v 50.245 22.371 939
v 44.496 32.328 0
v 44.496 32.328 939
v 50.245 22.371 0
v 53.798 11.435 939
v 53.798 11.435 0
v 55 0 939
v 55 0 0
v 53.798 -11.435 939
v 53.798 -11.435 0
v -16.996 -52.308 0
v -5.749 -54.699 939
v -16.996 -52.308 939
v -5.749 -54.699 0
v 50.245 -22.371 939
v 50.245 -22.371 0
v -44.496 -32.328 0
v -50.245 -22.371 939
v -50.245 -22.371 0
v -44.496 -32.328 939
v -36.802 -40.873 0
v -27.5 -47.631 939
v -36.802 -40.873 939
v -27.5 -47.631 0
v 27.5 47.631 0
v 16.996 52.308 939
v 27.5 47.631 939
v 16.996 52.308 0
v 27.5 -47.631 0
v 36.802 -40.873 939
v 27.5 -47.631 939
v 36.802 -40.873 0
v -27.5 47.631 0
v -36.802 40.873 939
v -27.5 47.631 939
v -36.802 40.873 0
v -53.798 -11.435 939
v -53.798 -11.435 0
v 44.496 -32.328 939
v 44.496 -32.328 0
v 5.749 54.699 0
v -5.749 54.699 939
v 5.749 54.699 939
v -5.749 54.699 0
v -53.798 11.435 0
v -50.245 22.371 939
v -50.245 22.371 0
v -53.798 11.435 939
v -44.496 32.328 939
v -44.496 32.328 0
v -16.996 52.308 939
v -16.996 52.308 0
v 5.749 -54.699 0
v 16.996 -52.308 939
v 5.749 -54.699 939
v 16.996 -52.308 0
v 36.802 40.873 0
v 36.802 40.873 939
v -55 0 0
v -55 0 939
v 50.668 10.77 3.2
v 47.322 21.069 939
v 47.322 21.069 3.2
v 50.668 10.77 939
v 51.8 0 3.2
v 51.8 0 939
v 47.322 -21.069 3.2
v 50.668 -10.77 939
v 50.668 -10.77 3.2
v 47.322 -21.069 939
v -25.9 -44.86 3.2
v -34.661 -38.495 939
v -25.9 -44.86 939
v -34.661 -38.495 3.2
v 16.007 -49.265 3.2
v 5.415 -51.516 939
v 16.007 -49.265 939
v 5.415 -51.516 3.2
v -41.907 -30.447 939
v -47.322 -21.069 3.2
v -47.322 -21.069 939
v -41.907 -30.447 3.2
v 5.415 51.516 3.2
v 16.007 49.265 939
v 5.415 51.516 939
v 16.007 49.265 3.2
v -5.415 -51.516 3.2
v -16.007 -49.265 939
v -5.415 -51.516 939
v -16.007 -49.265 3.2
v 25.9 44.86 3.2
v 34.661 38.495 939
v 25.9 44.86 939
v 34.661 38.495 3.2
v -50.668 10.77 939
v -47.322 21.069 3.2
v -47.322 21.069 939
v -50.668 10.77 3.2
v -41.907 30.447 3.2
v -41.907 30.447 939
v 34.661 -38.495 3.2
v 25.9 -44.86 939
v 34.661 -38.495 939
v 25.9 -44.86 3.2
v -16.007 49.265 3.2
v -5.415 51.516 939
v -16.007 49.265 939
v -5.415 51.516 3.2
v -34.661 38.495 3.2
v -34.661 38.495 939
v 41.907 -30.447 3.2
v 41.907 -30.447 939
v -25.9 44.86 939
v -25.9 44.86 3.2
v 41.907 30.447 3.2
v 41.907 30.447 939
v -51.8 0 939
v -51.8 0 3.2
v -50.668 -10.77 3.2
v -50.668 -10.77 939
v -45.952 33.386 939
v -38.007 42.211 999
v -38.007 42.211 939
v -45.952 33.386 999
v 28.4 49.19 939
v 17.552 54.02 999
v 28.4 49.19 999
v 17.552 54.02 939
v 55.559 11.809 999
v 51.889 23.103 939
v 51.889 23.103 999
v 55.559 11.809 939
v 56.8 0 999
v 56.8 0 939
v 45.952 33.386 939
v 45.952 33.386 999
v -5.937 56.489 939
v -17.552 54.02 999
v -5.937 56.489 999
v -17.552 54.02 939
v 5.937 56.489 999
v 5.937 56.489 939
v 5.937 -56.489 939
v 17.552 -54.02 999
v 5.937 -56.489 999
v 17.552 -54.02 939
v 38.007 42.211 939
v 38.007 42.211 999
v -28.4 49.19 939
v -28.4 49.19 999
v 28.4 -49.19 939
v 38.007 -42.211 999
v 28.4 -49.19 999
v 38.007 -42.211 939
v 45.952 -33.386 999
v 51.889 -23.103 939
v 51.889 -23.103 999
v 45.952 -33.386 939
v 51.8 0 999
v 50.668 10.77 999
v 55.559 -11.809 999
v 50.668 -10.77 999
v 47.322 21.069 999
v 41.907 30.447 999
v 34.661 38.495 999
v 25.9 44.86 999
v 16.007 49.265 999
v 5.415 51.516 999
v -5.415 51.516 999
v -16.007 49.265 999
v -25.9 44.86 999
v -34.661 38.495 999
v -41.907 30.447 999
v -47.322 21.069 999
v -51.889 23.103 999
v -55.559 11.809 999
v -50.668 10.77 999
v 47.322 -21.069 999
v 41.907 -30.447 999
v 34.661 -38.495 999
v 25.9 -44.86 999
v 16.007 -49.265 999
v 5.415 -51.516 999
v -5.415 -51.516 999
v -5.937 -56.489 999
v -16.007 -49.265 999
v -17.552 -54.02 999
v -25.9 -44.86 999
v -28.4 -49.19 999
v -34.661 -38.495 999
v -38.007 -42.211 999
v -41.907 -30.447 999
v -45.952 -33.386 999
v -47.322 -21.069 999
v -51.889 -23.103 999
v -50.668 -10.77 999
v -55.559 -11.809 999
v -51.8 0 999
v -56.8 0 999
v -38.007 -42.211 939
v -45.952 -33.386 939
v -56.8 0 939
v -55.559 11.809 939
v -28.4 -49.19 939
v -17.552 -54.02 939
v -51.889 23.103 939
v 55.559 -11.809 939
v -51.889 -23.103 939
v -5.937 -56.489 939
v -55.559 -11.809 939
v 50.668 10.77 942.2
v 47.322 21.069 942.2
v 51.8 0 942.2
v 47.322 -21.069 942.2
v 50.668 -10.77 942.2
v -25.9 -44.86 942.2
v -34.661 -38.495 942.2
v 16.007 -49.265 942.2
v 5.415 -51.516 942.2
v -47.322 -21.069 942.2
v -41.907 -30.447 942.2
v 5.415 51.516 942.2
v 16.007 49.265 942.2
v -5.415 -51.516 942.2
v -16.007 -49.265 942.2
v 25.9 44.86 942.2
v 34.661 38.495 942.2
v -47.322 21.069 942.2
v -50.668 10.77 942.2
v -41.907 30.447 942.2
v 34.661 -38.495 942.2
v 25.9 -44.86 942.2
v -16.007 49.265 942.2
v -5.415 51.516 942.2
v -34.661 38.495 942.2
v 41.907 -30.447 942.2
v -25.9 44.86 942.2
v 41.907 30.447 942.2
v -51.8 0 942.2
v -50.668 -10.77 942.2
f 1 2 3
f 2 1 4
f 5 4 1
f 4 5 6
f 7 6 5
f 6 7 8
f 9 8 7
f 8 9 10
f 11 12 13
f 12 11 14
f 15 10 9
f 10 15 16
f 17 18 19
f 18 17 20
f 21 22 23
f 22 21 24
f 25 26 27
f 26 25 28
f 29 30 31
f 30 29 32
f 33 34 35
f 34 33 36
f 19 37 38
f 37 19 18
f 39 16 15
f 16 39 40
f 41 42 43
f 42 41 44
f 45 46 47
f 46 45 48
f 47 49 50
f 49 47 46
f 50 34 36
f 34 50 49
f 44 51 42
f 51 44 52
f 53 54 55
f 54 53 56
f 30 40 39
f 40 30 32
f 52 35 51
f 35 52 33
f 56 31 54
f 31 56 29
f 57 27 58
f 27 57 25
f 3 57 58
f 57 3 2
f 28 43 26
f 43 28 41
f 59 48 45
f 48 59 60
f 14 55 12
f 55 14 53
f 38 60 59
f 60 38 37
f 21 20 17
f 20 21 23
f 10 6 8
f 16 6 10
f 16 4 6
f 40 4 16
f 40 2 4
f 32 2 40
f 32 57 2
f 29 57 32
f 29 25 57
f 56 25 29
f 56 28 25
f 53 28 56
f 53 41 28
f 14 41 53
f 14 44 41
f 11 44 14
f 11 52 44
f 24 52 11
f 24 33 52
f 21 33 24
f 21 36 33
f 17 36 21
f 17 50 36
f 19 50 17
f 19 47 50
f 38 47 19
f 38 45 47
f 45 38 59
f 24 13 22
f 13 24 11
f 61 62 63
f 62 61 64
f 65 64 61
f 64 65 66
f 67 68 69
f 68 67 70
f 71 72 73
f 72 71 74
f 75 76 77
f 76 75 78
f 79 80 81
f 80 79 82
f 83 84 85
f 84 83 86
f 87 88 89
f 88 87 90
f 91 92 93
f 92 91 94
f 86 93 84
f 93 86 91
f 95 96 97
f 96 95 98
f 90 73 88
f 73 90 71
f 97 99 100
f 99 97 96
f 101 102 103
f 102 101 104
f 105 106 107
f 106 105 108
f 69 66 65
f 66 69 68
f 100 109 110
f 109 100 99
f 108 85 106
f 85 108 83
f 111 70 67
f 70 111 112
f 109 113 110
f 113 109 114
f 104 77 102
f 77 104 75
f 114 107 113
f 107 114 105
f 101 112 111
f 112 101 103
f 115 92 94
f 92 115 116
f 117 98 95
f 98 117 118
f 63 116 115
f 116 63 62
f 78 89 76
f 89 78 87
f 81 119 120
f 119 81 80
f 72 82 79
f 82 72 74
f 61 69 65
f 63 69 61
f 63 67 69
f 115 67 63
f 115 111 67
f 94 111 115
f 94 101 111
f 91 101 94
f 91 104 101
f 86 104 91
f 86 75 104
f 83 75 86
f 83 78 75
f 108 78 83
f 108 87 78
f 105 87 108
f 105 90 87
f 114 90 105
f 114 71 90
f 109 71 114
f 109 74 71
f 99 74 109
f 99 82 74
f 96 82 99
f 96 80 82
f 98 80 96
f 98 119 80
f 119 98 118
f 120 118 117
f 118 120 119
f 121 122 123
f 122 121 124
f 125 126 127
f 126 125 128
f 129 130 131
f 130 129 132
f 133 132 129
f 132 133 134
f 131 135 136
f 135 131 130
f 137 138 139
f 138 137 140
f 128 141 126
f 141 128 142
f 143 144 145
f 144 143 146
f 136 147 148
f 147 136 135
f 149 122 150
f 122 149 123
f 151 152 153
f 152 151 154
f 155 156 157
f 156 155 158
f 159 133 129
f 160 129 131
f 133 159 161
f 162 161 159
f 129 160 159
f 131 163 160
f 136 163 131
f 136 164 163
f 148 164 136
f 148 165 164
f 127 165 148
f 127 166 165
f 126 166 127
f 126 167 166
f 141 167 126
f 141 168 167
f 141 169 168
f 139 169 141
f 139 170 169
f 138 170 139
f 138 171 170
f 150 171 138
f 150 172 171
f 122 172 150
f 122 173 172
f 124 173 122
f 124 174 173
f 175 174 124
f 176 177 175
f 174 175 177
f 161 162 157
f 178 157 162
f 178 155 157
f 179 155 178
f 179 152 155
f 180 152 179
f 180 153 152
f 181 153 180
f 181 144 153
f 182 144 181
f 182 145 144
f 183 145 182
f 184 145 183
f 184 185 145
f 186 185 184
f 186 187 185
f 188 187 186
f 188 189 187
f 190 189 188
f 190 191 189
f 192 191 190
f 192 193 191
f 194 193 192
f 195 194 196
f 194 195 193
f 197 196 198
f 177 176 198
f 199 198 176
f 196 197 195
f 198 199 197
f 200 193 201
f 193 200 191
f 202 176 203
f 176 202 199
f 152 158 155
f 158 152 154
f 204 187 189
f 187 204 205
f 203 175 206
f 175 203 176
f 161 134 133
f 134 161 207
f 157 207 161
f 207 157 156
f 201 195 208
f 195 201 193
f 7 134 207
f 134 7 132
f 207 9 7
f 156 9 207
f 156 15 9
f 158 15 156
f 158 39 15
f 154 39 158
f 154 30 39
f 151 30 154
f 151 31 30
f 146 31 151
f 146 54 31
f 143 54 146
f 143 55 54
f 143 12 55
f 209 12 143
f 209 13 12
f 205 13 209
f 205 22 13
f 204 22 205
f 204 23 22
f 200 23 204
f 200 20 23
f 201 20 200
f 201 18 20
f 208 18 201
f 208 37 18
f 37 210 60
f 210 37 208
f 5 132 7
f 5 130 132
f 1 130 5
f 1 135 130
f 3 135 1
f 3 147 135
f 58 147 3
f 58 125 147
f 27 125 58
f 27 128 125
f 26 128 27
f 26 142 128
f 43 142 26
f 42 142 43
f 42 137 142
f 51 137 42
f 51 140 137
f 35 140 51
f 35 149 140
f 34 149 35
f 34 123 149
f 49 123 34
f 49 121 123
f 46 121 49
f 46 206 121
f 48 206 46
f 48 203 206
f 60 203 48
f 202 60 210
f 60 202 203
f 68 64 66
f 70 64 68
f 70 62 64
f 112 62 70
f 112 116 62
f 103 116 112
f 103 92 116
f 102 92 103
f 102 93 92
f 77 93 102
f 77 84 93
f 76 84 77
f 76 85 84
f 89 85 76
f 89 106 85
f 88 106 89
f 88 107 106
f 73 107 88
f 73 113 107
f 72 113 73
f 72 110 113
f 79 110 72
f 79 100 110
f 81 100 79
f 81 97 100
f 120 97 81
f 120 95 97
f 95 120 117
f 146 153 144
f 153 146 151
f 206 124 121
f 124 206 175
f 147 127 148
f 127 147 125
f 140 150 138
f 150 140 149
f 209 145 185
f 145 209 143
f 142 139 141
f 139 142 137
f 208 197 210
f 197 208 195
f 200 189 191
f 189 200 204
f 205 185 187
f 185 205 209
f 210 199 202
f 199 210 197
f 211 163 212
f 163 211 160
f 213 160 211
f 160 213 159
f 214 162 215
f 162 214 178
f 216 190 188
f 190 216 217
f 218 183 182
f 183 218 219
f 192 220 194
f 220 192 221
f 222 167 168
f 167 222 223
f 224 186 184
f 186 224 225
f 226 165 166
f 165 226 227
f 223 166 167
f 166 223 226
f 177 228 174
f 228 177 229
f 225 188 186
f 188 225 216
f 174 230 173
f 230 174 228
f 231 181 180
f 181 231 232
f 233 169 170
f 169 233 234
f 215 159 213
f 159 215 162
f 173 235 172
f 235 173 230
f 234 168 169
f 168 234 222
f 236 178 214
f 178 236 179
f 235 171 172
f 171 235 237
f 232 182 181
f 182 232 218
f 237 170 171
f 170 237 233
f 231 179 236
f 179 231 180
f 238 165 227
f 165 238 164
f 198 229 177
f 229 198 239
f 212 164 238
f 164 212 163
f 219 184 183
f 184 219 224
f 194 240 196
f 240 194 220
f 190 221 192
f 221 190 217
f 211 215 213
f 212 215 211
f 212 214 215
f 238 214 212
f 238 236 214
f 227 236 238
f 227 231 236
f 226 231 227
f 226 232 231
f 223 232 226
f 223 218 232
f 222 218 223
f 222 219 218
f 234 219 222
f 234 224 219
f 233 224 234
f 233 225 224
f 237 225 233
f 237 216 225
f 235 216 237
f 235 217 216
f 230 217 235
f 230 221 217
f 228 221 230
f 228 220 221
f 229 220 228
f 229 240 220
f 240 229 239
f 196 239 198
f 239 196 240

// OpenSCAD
// Parameters
pipe_standard = 1; //[1:1:1]
nominal_diameter_mm = 110; //[55:220:1]
length_mm = 1000; //[500:2000:10]
wall_thickness_mm = 3.2; //[1.6:6.4:0.1]
fitting_length_mm = 60; //[30:120:1]
fitting_wall_extra_mm = 1.8; //[0.5:4:0.1]
overlap_mm = 1; //[0.5:2:0.1]

// Module for the HT Pipe
module ht_pipe() {
  color([0.85, 0.85, 0.8]) { // PVC color
    union() {
      // Pipe body
      difference() {
        cylinder(h=length_mm - fitting_length_mm, r=nominal_diameter_mm/2, center=false);
        translate([0, 0, wall_thickness_mm])
          cylinder(h=length_mm - fitting_length_mm, r=nominal_diameter_mm/2 - wall_thickness_mm, center=false);
      }
      
      // End fitting
      difference() {
        translate([0, 0, length_mm - fitting_length_mm - overlap_mm])
          cylinder(h=fitting_length_mm, r=nominal_diameter_mm/2 + fitting_wall_extra_mm, center=false);
        translate([0, 0, length_mm - fitting_length_mm - overlap_mm + wall_thickness_mm])
          cylinder(h=fitting_length_mm, r=nominal_diameter_mm/2 - wall_thickness_mm, center=false);
      }
    }
  }
}

// Assembly
module assembly() {
  ht_pipe();
}

assembly();
